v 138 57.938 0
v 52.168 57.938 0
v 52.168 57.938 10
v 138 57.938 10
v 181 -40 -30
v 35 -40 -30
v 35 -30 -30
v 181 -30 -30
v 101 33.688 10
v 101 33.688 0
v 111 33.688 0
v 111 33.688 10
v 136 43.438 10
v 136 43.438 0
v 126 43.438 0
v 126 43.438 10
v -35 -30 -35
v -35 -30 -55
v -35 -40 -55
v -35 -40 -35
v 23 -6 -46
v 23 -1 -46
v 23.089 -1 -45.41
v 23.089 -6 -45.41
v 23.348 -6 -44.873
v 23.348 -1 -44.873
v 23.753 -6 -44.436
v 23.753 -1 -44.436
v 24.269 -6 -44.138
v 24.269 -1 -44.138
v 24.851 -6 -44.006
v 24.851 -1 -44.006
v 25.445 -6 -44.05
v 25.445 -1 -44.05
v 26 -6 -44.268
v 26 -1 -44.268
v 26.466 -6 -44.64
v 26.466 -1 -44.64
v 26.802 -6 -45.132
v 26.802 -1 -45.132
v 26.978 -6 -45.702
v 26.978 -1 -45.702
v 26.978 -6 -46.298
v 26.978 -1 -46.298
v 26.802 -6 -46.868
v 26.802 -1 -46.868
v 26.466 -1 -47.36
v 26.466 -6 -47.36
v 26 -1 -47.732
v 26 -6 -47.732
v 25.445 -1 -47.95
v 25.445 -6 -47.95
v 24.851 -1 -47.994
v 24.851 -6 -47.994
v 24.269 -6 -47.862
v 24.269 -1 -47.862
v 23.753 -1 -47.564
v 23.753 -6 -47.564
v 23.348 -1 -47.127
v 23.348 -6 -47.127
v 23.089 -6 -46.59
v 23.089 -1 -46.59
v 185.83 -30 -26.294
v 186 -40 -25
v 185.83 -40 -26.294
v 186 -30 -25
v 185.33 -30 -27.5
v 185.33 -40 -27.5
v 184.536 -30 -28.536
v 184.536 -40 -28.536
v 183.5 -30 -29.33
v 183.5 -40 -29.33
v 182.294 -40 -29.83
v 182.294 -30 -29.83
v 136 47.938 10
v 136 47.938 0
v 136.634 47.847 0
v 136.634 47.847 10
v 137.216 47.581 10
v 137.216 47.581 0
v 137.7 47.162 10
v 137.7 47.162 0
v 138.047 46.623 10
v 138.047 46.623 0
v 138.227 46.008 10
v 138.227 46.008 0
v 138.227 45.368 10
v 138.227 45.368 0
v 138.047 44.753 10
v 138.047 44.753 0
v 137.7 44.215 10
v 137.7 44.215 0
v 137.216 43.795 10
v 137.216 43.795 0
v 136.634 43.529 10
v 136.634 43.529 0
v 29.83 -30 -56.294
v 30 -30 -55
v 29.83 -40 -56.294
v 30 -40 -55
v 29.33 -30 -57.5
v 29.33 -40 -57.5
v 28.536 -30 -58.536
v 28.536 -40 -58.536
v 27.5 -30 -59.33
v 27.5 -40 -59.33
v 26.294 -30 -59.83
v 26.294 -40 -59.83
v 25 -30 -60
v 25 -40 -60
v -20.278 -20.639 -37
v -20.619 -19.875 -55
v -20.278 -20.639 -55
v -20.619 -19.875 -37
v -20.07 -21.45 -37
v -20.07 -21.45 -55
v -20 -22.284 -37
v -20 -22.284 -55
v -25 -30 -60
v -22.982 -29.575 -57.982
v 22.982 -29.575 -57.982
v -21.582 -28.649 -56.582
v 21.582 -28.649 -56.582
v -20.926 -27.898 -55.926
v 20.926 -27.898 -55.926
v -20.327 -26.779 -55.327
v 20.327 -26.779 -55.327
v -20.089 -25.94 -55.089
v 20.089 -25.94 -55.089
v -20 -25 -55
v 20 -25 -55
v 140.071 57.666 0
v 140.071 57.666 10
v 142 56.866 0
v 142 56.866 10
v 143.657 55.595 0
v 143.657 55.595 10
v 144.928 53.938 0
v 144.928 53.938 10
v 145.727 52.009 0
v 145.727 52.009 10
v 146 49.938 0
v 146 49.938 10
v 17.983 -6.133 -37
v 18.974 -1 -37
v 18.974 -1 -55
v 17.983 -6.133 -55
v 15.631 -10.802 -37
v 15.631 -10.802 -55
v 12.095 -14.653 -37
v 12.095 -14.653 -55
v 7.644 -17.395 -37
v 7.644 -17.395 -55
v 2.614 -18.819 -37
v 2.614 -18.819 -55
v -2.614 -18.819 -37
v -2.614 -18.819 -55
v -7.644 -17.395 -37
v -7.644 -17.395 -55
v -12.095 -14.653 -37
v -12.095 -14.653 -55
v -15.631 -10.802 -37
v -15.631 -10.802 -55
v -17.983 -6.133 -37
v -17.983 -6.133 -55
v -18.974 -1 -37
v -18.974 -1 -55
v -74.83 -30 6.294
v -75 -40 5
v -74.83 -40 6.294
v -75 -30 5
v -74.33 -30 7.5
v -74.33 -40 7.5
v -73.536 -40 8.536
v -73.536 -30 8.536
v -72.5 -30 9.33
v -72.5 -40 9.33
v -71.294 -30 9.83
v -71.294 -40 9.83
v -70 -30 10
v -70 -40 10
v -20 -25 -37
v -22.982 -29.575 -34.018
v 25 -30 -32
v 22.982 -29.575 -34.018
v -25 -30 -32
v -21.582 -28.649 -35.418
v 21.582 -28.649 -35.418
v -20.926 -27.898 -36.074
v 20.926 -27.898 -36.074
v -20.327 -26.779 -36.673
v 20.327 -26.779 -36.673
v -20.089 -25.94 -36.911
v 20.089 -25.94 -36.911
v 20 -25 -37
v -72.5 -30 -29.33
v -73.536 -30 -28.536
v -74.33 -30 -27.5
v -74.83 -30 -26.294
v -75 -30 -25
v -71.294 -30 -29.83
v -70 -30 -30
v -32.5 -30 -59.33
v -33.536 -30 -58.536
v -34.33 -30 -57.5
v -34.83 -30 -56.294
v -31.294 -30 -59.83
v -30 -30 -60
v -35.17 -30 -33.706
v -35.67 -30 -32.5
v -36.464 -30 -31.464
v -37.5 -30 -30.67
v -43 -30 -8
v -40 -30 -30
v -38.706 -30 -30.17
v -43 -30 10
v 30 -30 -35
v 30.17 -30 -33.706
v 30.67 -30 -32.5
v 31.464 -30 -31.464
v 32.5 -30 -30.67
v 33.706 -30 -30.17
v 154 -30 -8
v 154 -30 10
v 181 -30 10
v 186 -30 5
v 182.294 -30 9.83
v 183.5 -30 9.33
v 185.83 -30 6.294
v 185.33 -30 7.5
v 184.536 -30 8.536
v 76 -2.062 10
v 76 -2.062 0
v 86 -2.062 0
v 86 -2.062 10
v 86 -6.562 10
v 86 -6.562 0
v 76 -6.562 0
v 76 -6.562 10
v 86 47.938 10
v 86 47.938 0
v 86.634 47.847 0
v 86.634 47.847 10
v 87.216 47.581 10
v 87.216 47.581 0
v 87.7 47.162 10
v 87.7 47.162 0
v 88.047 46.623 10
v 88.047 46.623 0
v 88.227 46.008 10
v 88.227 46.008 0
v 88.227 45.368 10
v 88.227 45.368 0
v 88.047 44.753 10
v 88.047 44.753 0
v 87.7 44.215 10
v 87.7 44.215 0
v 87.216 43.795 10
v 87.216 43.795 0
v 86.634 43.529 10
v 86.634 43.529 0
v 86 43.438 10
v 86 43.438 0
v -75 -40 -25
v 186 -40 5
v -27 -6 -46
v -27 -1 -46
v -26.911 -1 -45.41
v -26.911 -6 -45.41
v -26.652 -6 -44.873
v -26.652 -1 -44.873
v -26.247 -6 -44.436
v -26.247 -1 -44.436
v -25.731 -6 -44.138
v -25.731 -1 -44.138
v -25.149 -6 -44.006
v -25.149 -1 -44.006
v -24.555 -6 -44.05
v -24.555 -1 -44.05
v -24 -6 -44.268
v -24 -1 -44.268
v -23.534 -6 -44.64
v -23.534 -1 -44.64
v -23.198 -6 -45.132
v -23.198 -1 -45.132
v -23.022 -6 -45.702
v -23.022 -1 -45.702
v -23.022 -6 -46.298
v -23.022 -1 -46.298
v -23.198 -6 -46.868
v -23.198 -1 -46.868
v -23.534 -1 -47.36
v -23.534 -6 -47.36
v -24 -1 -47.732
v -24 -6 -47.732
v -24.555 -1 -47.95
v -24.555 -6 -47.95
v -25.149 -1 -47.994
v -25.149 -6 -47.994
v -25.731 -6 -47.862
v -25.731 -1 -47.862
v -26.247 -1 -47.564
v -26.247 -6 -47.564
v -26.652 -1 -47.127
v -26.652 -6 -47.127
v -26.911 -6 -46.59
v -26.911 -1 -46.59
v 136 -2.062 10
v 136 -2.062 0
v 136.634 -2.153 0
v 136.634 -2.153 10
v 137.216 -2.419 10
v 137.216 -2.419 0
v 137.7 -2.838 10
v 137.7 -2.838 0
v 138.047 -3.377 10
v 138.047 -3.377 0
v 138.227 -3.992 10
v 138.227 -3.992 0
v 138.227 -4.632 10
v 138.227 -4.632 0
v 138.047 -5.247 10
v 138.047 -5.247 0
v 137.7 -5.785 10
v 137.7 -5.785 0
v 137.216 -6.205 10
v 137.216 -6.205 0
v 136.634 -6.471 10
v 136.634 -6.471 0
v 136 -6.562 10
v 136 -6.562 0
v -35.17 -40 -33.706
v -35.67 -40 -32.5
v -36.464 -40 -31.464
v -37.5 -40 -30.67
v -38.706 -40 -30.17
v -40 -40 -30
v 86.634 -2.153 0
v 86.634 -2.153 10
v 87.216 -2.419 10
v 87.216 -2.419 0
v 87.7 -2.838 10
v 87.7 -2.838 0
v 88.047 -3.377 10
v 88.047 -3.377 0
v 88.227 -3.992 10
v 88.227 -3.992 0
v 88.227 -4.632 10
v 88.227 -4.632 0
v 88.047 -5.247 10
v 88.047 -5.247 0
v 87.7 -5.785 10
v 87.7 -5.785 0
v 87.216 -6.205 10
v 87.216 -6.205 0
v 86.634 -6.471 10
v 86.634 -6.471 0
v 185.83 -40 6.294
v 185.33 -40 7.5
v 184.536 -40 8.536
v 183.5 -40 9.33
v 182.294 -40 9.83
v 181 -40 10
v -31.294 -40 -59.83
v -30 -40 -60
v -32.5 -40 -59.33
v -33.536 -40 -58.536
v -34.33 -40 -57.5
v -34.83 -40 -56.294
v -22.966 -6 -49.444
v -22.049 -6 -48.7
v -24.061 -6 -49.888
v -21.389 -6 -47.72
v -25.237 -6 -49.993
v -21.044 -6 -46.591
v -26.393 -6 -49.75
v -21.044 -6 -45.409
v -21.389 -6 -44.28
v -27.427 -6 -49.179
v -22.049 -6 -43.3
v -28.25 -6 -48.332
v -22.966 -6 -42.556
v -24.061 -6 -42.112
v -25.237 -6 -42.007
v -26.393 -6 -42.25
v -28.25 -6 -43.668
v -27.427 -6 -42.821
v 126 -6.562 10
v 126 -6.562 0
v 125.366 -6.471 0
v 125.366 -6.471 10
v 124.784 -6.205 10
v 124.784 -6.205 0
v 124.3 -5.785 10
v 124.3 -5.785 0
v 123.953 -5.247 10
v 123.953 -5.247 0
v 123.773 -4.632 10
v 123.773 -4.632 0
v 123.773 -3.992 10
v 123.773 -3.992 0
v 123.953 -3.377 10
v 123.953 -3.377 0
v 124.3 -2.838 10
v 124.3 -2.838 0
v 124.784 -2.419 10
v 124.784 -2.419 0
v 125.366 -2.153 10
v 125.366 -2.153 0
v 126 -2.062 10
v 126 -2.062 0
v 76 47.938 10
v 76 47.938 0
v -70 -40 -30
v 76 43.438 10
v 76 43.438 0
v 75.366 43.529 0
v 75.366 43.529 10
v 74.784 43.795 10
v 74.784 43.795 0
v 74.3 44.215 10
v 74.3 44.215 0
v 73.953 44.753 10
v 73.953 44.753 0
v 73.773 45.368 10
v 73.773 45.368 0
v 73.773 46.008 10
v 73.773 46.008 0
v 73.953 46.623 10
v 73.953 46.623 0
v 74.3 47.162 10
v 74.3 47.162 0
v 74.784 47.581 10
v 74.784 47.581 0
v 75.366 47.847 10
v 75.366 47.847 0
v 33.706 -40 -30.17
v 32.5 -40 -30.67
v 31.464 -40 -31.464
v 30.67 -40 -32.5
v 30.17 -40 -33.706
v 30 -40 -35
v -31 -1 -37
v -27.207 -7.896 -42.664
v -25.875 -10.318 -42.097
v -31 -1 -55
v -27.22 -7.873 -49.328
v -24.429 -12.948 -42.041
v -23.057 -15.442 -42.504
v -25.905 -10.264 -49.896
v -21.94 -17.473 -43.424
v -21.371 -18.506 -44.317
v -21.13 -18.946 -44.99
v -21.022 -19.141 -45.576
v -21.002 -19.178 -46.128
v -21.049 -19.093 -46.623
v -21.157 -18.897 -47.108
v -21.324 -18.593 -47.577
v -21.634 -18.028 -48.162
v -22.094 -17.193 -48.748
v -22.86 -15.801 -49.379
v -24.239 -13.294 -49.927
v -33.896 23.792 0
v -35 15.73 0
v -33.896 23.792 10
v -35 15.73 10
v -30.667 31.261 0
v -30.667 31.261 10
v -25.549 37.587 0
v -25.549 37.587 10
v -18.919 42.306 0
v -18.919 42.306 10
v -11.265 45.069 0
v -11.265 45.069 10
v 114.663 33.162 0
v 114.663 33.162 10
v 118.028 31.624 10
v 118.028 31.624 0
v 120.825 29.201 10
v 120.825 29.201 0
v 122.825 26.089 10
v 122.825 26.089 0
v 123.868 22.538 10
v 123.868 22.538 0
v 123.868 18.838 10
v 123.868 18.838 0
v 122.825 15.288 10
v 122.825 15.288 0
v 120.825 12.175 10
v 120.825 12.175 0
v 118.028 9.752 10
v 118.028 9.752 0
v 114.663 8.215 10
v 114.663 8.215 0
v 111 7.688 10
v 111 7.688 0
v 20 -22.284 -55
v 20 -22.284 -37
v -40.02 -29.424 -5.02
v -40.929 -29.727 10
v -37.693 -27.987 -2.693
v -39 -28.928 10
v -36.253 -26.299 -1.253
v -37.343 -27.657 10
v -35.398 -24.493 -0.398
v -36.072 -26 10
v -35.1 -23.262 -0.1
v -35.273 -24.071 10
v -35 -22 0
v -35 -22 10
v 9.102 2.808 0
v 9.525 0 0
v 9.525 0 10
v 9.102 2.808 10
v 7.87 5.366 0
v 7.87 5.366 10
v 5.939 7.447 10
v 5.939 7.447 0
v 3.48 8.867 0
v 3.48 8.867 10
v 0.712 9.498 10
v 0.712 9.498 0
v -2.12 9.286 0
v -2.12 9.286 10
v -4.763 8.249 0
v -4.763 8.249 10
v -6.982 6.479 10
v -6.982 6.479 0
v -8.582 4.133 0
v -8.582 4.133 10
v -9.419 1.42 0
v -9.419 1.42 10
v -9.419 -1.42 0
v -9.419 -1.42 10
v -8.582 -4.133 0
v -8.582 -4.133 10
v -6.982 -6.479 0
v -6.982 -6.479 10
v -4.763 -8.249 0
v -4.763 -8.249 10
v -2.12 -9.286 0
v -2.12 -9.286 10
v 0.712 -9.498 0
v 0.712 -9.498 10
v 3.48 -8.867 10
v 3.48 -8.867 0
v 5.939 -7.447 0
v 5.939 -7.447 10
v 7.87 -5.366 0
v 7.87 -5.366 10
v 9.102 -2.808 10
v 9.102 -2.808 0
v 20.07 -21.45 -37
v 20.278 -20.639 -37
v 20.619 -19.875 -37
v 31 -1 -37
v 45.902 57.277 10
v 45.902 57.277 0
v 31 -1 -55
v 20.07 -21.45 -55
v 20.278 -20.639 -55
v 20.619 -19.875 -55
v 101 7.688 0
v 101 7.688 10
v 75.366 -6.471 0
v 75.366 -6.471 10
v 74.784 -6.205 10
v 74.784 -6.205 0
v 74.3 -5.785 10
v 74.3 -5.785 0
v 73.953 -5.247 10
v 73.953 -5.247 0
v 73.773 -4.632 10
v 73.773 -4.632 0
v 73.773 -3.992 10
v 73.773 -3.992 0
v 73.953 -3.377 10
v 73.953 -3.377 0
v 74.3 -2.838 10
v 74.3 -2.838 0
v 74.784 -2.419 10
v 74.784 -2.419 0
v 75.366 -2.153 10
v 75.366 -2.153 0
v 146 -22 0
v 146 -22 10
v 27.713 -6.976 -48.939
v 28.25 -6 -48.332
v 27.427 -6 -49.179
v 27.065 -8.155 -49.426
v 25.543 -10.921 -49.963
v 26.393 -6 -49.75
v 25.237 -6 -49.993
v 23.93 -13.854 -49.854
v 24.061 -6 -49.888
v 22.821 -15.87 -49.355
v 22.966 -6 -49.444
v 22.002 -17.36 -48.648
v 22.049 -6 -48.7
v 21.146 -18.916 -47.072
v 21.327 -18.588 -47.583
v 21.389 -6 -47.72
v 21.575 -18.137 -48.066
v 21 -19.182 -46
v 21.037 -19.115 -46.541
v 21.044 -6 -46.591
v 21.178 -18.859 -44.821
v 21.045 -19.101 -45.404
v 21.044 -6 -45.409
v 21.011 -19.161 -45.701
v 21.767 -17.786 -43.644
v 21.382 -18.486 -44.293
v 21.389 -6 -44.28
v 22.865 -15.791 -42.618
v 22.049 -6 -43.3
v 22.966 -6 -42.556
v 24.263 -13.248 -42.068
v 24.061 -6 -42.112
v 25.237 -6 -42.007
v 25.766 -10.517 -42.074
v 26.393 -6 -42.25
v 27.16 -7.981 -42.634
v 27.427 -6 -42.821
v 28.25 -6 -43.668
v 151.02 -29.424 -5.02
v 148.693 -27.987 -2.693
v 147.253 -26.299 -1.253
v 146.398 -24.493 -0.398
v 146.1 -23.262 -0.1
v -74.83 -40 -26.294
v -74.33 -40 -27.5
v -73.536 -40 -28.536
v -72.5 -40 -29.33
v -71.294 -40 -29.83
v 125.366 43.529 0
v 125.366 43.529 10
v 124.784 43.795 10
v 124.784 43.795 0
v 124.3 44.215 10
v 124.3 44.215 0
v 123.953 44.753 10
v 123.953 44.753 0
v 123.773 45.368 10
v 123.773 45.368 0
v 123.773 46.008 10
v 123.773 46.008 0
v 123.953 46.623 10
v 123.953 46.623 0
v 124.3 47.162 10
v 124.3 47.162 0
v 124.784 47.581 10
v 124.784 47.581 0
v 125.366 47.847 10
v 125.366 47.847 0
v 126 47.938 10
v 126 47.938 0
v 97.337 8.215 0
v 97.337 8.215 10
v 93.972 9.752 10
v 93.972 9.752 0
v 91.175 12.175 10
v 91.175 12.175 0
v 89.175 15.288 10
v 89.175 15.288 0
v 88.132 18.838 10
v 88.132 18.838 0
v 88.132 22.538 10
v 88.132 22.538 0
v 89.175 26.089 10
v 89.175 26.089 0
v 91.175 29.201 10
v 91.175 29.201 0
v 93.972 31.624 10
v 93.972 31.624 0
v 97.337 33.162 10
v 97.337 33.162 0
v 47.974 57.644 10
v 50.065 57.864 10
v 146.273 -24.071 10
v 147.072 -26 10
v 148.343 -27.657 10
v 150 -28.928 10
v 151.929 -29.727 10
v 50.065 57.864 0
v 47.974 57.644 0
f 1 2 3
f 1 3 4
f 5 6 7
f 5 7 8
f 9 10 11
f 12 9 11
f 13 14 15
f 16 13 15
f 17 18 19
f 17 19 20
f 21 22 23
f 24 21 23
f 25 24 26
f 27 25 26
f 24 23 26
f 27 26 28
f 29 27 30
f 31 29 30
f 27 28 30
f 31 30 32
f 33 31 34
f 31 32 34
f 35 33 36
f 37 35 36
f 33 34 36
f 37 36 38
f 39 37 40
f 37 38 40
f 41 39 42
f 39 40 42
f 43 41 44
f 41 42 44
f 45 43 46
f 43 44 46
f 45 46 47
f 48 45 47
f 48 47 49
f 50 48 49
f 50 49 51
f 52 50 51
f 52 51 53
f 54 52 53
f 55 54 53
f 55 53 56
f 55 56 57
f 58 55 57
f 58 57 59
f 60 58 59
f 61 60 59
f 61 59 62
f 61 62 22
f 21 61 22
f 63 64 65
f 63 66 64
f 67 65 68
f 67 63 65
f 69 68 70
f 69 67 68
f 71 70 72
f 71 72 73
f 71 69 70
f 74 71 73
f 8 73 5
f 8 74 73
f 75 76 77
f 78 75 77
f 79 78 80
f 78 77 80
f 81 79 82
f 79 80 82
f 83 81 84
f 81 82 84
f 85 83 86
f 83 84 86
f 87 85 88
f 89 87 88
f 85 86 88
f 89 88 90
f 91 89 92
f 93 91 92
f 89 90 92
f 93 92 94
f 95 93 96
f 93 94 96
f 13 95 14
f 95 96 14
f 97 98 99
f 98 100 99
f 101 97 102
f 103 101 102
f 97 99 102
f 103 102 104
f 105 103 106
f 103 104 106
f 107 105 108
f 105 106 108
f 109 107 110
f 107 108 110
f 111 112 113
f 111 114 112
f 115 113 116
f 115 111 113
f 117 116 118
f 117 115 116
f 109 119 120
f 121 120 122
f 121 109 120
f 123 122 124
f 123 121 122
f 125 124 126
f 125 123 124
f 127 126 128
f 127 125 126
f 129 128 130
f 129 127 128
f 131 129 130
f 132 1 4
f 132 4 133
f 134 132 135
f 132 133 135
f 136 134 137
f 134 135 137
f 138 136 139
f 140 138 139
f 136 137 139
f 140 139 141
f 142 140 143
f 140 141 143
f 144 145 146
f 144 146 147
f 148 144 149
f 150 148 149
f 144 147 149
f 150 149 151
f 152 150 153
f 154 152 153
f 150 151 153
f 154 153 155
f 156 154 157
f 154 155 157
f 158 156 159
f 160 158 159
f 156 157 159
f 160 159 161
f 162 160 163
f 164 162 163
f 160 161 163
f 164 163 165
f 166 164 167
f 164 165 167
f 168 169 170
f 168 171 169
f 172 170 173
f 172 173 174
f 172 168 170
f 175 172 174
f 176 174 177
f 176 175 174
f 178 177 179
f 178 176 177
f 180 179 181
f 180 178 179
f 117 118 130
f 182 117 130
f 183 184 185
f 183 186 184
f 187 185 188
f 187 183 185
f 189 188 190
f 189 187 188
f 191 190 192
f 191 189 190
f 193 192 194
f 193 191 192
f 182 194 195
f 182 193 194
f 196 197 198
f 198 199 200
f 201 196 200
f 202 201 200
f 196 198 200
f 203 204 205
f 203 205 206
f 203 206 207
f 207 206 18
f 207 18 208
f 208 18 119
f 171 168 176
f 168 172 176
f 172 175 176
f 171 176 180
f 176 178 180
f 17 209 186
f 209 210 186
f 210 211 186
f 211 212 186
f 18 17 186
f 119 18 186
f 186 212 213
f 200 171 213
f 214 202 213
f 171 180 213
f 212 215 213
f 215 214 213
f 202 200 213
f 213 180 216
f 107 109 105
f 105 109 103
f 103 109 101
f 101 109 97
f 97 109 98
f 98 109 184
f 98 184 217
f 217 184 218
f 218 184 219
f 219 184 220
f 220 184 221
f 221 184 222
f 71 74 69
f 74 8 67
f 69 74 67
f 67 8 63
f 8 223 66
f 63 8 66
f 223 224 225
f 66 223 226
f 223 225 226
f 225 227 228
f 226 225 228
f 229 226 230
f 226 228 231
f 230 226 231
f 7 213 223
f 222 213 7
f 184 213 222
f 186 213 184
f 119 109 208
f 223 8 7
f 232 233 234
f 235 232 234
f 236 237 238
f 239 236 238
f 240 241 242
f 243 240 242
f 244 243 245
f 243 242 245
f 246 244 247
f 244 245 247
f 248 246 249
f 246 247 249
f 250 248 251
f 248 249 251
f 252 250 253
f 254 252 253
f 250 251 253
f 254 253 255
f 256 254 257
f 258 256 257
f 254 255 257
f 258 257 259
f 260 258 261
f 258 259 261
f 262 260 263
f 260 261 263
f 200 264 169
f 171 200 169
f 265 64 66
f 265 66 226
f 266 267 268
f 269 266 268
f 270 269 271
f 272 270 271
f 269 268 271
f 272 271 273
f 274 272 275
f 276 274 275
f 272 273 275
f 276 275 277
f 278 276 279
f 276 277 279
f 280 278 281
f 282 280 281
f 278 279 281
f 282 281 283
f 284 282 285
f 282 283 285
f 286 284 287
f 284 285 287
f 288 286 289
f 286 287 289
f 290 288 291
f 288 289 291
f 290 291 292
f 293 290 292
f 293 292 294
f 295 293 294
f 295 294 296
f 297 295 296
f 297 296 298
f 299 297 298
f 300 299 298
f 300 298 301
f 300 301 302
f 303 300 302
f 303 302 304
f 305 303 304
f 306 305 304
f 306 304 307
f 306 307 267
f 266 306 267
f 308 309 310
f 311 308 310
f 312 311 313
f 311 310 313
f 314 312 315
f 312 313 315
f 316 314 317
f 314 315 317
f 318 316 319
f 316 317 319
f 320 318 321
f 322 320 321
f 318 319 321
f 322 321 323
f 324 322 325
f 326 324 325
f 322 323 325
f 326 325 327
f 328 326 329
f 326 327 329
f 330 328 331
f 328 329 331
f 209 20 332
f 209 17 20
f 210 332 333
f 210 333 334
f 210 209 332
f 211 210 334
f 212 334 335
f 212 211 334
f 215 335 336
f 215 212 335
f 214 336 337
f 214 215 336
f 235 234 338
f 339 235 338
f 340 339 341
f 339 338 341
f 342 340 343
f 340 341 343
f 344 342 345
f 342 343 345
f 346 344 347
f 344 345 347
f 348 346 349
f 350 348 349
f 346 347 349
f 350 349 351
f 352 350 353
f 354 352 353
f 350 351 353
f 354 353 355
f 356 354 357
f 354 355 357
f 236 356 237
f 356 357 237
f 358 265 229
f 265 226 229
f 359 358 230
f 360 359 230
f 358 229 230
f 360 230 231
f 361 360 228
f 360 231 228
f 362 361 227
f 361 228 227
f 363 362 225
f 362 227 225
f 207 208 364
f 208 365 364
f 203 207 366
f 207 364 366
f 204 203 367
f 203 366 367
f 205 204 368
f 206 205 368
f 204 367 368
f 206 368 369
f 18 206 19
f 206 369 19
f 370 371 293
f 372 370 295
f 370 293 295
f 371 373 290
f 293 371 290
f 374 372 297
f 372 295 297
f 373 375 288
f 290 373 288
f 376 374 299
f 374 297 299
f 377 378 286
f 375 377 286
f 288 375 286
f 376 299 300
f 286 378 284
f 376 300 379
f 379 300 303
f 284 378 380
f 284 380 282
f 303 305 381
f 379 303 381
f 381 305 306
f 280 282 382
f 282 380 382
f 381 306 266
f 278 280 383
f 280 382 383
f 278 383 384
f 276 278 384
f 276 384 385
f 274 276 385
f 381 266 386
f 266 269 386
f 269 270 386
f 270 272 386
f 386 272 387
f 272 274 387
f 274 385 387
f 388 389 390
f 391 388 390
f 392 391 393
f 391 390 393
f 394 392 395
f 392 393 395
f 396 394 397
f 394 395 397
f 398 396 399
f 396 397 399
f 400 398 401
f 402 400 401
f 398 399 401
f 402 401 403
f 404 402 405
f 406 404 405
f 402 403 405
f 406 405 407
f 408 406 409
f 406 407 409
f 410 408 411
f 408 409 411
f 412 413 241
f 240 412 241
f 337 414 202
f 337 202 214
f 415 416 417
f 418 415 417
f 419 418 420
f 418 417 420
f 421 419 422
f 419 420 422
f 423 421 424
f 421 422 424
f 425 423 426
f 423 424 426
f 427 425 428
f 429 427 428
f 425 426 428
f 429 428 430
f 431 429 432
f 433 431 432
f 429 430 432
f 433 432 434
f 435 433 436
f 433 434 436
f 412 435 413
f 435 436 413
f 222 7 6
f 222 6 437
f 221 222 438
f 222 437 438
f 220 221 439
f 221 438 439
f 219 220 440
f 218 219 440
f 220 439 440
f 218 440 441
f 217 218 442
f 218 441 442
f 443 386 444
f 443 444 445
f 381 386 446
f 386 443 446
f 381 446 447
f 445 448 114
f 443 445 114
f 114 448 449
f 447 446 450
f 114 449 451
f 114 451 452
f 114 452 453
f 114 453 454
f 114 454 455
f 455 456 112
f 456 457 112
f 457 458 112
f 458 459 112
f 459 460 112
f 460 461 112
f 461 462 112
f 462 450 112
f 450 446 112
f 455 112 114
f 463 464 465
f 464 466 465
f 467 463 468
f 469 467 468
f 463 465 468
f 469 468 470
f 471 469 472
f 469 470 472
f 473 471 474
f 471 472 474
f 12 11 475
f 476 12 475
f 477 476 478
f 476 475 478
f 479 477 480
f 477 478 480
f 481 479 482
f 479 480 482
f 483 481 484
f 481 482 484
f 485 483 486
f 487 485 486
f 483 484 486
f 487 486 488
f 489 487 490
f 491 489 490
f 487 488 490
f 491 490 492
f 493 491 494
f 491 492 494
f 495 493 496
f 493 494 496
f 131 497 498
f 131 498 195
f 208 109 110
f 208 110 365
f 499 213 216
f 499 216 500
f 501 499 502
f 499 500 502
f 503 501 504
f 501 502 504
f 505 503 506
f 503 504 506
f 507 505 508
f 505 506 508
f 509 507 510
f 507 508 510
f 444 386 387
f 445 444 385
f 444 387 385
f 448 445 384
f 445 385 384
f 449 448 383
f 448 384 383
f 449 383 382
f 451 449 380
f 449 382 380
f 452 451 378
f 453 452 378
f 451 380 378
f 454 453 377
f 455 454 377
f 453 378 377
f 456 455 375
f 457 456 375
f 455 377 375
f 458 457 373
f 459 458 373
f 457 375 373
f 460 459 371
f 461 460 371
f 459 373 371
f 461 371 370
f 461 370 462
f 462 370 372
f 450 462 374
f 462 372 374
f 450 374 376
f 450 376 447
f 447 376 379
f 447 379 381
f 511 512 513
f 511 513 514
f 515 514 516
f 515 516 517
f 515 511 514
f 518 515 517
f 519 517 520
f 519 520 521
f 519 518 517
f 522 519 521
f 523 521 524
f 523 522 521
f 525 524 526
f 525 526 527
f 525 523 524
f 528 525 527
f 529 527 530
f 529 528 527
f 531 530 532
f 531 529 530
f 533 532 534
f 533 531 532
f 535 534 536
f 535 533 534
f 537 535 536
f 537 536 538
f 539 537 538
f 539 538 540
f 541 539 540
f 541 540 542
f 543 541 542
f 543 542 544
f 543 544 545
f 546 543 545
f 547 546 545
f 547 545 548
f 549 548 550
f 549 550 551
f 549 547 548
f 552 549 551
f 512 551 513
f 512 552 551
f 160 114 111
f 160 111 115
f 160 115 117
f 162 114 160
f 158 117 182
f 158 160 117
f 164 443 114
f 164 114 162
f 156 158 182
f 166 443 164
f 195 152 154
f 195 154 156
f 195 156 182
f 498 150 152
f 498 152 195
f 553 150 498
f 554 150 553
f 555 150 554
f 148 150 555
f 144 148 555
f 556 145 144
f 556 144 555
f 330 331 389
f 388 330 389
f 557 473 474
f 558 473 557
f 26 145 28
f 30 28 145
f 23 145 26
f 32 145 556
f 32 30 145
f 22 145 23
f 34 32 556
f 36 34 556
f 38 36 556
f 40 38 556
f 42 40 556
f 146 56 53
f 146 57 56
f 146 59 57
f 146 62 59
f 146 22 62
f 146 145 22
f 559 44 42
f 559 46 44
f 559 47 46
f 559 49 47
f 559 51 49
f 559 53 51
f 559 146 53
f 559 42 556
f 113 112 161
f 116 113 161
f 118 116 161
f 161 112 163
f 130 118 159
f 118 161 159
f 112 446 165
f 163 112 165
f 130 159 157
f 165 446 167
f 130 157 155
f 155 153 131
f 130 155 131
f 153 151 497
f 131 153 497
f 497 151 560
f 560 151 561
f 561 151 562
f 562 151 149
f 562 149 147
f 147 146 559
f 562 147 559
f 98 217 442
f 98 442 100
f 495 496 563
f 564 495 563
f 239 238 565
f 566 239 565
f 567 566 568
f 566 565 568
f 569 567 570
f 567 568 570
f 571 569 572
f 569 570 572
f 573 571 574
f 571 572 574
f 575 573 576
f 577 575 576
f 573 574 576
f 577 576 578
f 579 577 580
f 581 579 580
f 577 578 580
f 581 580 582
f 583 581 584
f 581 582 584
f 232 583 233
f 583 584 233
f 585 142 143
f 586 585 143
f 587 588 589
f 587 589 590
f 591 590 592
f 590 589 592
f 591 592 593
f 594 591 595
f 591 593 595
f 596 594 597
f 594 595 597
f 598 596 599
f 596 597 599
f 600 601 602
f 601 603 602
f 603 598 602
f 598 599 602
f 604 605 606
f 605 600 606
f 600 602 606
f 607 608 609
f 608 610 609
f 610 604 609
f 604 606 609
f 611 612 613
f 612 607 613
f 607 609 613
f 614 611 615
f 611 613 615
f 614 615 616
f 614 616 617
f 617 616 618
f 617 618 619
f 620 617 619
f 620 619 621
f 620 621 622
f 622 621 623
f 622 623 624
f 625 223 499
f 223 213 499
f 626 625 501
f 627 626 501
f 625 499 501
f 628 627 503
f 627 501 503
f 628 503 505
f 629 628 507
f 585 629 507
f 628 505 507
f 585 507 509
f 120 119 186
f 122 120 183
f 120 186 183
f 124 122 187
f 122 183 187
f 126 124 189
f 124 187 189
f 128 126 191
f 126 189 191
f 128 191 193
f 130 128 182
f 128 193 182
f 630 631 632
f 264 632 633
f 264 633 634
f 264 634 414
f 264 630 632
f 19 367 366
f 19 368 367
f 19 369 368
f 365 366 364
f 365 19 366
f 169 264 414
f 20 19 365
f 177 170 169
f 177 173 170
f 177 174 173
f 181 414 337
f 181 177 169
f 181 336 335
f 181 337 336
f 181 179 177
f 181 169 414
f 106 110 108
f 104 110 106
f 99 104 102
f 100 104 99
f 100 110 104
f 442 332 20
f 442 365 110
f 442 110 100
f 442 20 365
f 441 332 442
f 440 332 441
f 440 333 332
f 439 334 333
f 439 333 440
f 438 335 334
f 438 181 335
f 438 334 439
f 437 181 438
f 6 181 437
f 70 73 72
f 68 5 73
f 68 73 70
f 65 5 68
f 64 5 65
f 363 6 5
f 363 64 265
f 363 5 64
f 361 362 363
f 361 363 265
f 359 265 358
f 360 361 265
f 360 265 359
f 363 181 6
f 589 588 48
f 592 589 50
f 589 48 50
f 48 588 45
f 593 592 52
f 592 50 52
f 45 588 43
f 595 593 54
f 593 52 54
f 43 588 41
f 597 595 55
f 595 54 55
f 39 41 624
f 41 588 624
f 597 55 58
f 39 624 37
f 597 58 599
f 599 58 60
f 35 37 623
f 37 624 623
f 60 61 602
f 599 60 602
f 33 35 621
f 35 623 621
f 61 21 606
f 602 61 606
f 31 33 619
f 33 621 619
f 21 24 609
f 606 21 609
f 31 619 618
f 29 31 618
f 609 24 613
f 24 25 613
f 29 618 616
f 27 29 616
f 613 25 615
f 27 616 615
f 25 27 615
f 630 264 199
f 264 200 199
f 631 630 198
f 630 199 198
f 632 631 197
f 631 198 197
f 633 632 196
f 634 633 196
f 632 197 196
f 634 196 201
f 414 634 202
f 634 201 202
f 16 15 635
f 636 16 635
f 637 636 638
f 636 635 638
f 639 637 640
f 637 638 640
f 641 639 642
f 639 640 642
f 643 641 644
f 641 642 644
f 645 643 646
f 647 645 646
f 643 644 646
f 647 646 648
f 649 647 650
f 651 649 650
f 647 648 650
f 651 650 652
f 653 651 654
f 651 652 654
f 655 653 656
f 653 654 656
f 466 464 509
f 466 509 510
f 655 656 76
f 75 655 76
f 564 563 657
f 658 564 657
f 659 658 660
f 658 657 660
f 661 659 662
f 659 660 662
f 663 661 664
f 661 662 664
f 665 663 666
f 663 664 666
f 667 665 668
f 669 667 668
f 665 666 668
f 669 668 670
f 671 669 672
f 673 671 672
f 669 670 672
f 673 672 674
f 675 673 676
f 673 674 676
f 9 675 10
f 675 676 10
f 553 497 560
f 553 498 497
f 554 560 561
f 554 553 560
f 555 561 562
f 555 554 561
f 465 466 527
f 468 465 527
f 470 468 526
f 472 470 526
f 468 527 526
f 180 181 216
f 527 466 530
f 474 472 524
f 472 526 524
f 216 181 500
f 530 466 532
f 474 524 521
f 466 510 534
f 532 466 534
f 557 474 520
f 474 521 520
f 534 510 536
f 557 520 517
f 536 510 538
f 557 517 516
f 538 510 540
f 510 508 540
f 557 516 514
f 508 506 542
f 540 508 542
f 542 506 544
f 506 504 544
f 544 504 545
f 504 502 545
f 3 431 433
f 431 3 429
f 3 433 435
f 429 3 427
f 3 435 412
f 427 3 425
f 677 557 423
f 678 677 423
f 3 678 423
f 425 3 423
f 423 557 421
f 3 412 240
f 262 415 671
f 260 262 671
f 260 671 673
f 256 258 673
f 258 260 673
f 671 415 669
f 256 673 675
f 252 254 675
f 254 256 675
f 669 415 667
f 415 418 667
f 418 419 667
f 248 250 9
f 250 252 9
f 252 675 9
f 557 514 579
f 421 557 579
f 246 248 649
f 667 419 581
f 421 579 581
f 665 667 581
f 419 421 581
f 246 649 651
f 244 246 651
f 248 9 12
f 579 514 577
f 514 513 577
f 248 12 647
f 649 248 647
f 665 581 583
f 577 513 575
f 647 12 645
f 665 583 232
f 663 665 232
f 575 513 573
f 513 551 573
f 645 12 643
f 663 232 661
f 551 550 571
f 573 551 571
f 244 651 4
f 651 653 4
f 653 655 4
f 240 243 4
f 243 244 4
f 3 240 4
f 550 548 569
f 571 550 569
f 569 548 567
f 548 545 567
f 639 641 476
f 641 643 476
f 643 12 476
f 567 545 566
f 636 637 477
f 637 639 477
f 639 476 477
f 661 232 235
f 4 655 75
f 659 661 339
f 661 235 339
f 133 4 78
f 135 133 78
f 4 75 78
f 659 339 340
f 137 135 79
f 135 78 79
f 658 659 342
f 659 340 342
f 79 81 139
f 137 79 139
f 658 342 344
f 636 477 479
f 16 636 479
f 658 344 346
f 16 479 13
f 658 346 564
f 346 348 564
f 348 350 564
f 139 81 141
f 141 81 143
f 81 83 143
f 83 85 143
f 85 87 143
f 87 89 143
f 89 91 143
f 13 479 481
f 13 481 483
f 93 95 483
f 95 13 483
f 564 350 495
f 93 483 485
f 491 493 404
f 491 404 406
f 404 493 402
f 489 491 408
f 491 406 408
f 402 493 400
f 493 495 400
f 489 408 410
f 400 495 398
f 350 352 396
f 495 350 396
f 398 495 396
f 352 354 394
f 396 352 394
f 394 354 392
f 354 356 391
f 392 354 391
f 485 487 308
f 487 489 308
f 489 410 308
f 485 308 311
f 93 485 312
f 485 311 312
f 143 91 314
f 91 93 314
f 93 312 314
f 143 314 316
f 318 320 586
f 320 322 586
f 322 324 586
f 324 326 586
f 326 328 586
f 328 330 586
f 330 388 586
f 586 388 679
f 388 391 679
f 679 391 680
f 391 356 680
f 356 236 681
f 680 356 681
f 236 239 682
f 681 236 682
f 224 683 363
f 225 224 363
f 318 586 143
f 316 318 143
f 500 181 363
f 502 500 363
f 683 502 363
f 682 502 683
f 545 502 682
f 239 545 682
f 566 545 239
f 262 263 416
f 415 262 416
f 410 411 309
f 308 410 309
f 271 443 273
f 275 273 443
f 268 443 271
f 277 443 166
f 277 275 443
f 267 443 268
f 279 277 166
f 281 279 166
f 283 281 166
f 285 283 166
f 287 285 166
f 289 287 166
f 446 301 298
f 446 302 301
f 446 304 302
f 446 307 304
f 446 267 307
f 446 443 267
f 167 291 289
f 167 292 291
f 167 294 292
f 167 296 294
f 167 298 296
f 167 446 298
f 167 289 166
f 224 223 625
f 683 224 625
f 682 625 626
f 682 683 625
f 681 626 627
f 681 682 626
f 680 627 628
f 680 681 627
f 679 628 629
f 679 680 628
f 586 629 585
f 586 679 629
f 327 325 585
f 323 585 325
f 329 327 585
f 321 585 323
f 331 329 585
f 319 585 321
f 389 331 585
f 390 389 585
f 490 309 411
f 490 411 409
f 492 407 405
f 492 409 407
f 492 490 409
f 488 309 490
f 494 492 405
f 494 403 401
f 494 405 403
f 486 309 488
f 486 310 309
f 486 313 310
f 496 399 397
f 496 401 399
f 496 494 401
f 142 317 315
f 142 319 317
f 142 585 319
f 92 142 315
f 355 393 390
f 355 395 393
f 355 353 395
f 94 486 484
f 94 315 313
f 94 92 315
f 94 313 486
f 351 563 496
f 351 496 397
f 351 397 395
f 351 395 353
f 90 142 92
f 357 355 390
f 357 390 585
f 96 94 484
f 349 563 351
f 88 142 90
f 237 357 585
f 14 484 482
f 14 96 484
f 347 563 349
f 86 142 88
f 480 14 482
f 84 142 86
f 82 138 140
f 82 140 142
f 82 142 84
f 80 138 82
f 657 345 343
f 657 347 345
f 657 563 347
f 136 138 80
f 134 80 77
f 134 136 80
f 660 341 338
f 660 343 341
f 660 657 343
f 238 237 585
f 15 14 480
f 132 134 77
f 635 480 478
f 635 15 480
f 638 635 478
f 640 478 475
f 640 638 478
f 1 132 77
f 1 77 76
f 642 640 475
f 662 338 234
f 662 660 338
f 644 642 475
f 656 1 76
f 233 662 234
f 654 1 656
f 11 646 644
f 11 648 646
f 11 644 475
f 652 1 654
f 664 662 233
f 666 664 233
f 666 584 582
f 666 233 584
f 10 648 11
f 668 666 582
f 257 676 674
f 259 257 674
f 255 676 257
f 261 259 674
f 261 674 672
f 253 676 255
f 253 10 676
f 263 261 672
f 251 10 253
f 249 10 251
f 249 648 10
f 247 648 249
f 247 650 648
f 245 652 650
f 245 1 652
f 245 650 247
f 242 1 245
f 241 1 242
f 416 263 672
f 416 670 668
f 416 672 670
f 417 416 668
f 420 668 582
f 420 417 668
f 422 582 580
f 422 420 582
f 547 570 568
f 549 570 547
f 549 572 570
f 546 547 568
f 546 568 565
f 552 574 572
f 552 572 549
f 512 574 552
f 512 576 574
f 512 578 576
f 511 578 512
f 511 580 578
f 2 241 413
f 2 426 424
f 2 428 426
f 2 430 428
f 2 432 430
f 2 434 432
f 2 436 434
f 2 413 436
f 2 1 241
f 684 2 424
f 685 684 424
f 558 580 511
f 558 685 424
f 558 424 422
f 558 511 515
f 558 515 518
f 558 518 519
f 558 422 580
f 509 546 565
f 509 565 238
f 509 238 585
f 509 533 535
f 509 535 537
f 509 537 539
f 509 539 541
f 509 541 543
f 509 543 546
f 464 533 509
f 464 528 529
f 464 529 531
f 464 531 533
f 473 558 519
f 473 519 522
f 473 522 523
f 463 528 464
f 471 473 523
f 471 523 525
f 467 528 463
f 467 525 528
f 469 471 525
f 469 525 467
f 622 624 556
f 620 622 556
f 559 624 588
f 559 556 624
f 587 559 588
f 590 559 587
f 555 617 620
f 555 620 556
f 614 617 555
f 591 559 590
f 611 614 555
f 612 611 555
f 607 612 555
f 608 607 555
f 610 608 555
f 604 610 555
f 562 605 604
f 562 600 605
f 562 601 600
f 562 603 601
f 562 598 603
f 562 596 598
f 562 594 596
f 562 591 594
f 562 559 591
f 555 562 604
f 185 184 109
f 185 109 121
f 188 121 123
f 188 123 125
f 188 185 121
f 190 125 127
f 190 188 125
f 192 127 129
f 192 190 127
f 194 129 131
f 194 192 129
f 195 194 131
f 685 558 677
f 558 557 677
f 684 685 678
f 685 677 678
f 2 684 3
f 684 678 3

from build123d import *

# Parameters (mm, degrees)
SKETCH1_R           = 9.525
BOSS_EXTRUDE1_DEPTH = 10
SKETCH2_W           = 181
SKETCH2_H           = 100
BOSS_EXTRUDE2_DEPTH = 10
BOSS_EXTRUDE3_DEPTH = 18
SKETCH4_R           = 2
CUT_EXTRUDE1_DEPTH  = 30
SKETCH5_R           = 4
CUT_EXTRUDE2_DEPTH  = 20
CUT_EXTRUDE4_START  = -18
SKETCH8_W           = 62
SKETCH8_H           = 1
CUT_EXTRUDE4_DEPTH  = 18
CUT_EXTRUDE3_REACH  = 171.994
FILLET1_R           = 5
SKETCH9_W           = 40
SKETCH9_H           = 40
BOSS_EXTRUDE5_DEPTH = 10
CUT_EXTRUDE6_DEPTH  = 225.56428954
FILLET2_R           = 5
FILLET3_R           = 5
FILLET4_R           = 8
FILLET5_R           = 30


with BuildPart() as part:
    # Sketch1 → Boss-Extrude1 (new body)
    with BuildSketch(Plane.XY):
        Polygon((146, 57.938160866), (146, -30), (-35, -30), (-35, 40), (49, 57.938160866), align=None)
        Circle(SKETCH1_R, mode=Mode.SUBTRACT)
        with BuildLine():
            Line((101, 33.688160866), (111, 33.688160866))
            ThreePointArc((111, 33.688160866), (124, 20.688160866), (111, 7.688160866))
            Line((111, 7.688160866), (101, 7.688160866))
            ThreePointArc((101, 7.688160866), (88, 20.688160866), (101, 33.688160866))
        make_face(mode=Mode.SUBTRACT)
        with BuildLine():
            Line((86, 43.438160866), (76, 43.438160866))
            ThreePointArc((76, 43.438160866), (73.75, 45.688160866), (76, 47.938160866))
            Line((76, 47.938160866), (86, 47.938160866))
            ThreePointArc((86, 47.938160866), (88.25, 45.688160866), (86, 43.438160866))
        make_face(mode=Mode.SUBTRACT)
        with BuildLine():
            Line((86, -6.561839134), (76, -6.561839134))
            ThreePointArc((76, -6.561839134), (73.75, -4.311839134), (76, -2.061839134))
            Line((76, -2.061839134), (86, -2.061839134))
            ThreePointArc((86, -2.061839134), (88.25, -4.311839134), (86, -6.561839134))
        make_face(mode=Mode.SUBTRACT)
        with BuildLine():
            Line((126, -2.061839134), (136, -2.061839134))
            ThreePointArc((136, -2.061839134), (138.25, -4.311839134), (136, -6.561839134))
            Line((136, -6.561839134), (126, -6.561839134))
            ThreePointArc((126, -6.561839134), (123.75, -4.311839134), (126, -2.061839134))
        make_face(mode=Mode.SUBTRACT)
        with BuildLine():
            Line((126, 47.938160866), (136, 47.938160866))
            ThreePointArc((136, 47.938160866), (138.25, 45.688160866), (136, 43.438160866))
            Line((136, 43.438160866), (126, 43.438160866))
            ThreePointArc((126, 43.438160866), (123.75, 45.688160866), (126, 47.938160866))
        make_face(mode=Mode.SUBTRACT)
    extrude(amount=BOSS_EXTRUDE1_DEPTH)

    # Sketch2 → Boss-Extrude2 (add)
    with BuildSketch(Plane.XZ.offset(30)):
        with Locations((55.5, -40)):
            Rectangle(SKETCH2_W, SKETCH2_H)
    extrude(amount=BOSS_EXTRUDE2_DEPTH)

    # Sketch3 → Boss-Extrude3 (add)
    with BuildSketch(Plane.XY.offset(-55)):
        with BuildLine():
            Line((-31, 0), (-31, -40))
            Line((-31, -40), (31, -40))
            Line((31, -40), (31, 0))
            Line((31, 0), (19, 0))
            ThreePointArc((19, 0), (0, -19), (-19, 0))
            Line((-19, 0), (-31, 0))
        make_face()
    extrude(amount=BOSS_EXTRUDE3_DEPTH)

    # Sketch4 → Cut-Extrude1 (cut)
    with BuildSketch(Plane(origin=(0, 0, 0), x_dir=(1, 0, 0), z_dir=(0, 1, 0))):
        with Locations(Location((-25, 46, 0), (0, 0, 180))):
            Circle(SKETCH4_R)
        with Locations(Location((25, 46, 0), (0, 0, 180))):
            Circle(SKETCH4_R)
    extrude(amount=-CUT_EXTRUDE1_DEPTH, mode=Mode.SUBTRACT)

    # Sketch5 → Cut-Extrude2 (cut)
    with BuildSketch(Plane(origin=(0, -6, 0), x_dir=(1, 0, 0), z_dir=(0, 1, 0))):
        with Locations(Location((25, 46, 0), (0, 0, 180))):
            Circle(SKETCH5_R)
        with Locations(Location((-25, 46, 0), (0, 0, 180))):
            Circle(SKETCH5_R)
    extrude(amount=-CUT_EXTRUDE2_DEPTH, mode=Mode.SUBTRACT)

    # Sketch8 → Cut-Extrude4 (cut)
    with BuildSketch(Plane.XY.offset(-37).offset(CUT_EXTRUDE4_START)):
        with Locations((0, -0.5)):
            Rectangle(SKETCH8_W, SKETCH8_H)
    extrude(amount=CUT_EXTRUDE4_DEPTH, mode=Mode.SUBTRACT)

    # Sketch6 → Cut-Extrude3 (cut, up to next)
    with BuildSketch(Plane(origin=(0, 0, -55), x_dir=(-1, 0, 0), z_dir=(0, 0, -1)), mode=Mode.PRIVATE) as cut_extrude3_sk1:
        Polygon((31, -1), (20, -21), (20, -30), (31, -30), align=None)
    cut_extrude3_tool1 = extrude(cut_extrude3_sk1.sketch, amount=-CUT_EXTRUDE3_REACH, mode=Mode.PRIVATE) & part.part
    # Sketch6 → Cut-Extrude3 (cut, up to next)
    with BuildSketch(Plane(origin=(0, 0, -55), x_dir=(-1, 0, 0), z_dir=(0, 0, -1)), mode=Mode.PRIVATE) as cut_extrude3_sk2:
        Polygon((-31, -1), (-20, -21), (-20, -30), (-31, -30), align=None)
    cut_extrude3_tool2 = extrude(cut_extrude3_sk2.sketch, amount=-CUT_EXTRUDE3_REACH, mode=Mode.PRIVATE) & part.part
    add(cut_extrude3_tool1.solids().sort_by_distance((-26.464912, -19.622807, -55))[0], mode=Mode.SUBTRACT)
    add(cut_extrude3_tool2.solids().sort_by_distance((26.464912, -19.622807, -55))[0], mode=Mode.SUBTRACT)

    # Fillet1
    fillet1_edges = [part.edges().sort_by_distance(p)[0] for p in [
        (-20, -21, -46),
        (-20, -30, -46),
        (20, -30, -46),
        (20, -21, -46),
    ]]
    fillet(fillet1_edges, radius=FILLET1_R)

    # Sketch9 → Boss-Extrude5 (add)
    with BuildSketch(Plane.XZ.offset(40)):
        with Locations((-55, -10)):
            Rectangle(SKETCH9_W, SKETCH9_H)
        with Locations((166, -10)):
            Rectangle(SKETCH9_W, SKETCH9_H)
    extrude(amount=-BOSS_EXTRUDE5_DEPTH)

    # Sketch10 → Cut-Extrude6 (cut, through all)
    with BuildSketch(Plane(origin=(0, -30, 0), x_dir=(1, 0, 0), z_dir=(0, 1, 0))):
        Polygon((30, 30), (30, 60), (-35, 60), (-35, 90), (146, 90), (146, 30), align=None)
    extrude(amount=-CUT_EXTRUDE6_DEPTH, mode=Mode.SUBTRACT)

    # Fillet2
    fillet2_edges = [part.edges().sort_by_distance(p)[0] for p in [
        (-35, -35, -30),
        (-75, -35, -30),
        (-75, -35, 10),
        (186, -35, 10),
        (186, -35, -30),
        (-35, -35, -60),
        (30, -35, -30),
        (30, -35, -60),
    ]]
    fillet(fillet2_edges, radius=FILLET2_R)

    # Fillet3
    fillet3_edges = [part.edges().sort_by_distance(p)[0] for p in [
        (0, -30, -55),
        (0, -30, -37),
    ]]
    fillet(fillet3_edges, radius=FILLET3_R - 0.0001)  # a hair under: the kernel refuses the full size

    # Fillet4
    fillet4_edges = [part.edges().sort_by_distance(p)[0] for p in [
        (-35, -30, 5),
        (146, -30, 5),
        (55.5, -30, 0),
        (146, 57.938160866, 5),
    ]]
    fillet(fillet4_edges, radius=FILLET4_R)

    # Fillet5
    fillet5_edges = [part.edges().sort_by_distance(p)[0] for p in [
        (-35, 40, 5),
        (49, 57.938160866, 5),
    ]]
    fillet(fillet5_edges, radius=FILLET5_R)


solid = part.part
